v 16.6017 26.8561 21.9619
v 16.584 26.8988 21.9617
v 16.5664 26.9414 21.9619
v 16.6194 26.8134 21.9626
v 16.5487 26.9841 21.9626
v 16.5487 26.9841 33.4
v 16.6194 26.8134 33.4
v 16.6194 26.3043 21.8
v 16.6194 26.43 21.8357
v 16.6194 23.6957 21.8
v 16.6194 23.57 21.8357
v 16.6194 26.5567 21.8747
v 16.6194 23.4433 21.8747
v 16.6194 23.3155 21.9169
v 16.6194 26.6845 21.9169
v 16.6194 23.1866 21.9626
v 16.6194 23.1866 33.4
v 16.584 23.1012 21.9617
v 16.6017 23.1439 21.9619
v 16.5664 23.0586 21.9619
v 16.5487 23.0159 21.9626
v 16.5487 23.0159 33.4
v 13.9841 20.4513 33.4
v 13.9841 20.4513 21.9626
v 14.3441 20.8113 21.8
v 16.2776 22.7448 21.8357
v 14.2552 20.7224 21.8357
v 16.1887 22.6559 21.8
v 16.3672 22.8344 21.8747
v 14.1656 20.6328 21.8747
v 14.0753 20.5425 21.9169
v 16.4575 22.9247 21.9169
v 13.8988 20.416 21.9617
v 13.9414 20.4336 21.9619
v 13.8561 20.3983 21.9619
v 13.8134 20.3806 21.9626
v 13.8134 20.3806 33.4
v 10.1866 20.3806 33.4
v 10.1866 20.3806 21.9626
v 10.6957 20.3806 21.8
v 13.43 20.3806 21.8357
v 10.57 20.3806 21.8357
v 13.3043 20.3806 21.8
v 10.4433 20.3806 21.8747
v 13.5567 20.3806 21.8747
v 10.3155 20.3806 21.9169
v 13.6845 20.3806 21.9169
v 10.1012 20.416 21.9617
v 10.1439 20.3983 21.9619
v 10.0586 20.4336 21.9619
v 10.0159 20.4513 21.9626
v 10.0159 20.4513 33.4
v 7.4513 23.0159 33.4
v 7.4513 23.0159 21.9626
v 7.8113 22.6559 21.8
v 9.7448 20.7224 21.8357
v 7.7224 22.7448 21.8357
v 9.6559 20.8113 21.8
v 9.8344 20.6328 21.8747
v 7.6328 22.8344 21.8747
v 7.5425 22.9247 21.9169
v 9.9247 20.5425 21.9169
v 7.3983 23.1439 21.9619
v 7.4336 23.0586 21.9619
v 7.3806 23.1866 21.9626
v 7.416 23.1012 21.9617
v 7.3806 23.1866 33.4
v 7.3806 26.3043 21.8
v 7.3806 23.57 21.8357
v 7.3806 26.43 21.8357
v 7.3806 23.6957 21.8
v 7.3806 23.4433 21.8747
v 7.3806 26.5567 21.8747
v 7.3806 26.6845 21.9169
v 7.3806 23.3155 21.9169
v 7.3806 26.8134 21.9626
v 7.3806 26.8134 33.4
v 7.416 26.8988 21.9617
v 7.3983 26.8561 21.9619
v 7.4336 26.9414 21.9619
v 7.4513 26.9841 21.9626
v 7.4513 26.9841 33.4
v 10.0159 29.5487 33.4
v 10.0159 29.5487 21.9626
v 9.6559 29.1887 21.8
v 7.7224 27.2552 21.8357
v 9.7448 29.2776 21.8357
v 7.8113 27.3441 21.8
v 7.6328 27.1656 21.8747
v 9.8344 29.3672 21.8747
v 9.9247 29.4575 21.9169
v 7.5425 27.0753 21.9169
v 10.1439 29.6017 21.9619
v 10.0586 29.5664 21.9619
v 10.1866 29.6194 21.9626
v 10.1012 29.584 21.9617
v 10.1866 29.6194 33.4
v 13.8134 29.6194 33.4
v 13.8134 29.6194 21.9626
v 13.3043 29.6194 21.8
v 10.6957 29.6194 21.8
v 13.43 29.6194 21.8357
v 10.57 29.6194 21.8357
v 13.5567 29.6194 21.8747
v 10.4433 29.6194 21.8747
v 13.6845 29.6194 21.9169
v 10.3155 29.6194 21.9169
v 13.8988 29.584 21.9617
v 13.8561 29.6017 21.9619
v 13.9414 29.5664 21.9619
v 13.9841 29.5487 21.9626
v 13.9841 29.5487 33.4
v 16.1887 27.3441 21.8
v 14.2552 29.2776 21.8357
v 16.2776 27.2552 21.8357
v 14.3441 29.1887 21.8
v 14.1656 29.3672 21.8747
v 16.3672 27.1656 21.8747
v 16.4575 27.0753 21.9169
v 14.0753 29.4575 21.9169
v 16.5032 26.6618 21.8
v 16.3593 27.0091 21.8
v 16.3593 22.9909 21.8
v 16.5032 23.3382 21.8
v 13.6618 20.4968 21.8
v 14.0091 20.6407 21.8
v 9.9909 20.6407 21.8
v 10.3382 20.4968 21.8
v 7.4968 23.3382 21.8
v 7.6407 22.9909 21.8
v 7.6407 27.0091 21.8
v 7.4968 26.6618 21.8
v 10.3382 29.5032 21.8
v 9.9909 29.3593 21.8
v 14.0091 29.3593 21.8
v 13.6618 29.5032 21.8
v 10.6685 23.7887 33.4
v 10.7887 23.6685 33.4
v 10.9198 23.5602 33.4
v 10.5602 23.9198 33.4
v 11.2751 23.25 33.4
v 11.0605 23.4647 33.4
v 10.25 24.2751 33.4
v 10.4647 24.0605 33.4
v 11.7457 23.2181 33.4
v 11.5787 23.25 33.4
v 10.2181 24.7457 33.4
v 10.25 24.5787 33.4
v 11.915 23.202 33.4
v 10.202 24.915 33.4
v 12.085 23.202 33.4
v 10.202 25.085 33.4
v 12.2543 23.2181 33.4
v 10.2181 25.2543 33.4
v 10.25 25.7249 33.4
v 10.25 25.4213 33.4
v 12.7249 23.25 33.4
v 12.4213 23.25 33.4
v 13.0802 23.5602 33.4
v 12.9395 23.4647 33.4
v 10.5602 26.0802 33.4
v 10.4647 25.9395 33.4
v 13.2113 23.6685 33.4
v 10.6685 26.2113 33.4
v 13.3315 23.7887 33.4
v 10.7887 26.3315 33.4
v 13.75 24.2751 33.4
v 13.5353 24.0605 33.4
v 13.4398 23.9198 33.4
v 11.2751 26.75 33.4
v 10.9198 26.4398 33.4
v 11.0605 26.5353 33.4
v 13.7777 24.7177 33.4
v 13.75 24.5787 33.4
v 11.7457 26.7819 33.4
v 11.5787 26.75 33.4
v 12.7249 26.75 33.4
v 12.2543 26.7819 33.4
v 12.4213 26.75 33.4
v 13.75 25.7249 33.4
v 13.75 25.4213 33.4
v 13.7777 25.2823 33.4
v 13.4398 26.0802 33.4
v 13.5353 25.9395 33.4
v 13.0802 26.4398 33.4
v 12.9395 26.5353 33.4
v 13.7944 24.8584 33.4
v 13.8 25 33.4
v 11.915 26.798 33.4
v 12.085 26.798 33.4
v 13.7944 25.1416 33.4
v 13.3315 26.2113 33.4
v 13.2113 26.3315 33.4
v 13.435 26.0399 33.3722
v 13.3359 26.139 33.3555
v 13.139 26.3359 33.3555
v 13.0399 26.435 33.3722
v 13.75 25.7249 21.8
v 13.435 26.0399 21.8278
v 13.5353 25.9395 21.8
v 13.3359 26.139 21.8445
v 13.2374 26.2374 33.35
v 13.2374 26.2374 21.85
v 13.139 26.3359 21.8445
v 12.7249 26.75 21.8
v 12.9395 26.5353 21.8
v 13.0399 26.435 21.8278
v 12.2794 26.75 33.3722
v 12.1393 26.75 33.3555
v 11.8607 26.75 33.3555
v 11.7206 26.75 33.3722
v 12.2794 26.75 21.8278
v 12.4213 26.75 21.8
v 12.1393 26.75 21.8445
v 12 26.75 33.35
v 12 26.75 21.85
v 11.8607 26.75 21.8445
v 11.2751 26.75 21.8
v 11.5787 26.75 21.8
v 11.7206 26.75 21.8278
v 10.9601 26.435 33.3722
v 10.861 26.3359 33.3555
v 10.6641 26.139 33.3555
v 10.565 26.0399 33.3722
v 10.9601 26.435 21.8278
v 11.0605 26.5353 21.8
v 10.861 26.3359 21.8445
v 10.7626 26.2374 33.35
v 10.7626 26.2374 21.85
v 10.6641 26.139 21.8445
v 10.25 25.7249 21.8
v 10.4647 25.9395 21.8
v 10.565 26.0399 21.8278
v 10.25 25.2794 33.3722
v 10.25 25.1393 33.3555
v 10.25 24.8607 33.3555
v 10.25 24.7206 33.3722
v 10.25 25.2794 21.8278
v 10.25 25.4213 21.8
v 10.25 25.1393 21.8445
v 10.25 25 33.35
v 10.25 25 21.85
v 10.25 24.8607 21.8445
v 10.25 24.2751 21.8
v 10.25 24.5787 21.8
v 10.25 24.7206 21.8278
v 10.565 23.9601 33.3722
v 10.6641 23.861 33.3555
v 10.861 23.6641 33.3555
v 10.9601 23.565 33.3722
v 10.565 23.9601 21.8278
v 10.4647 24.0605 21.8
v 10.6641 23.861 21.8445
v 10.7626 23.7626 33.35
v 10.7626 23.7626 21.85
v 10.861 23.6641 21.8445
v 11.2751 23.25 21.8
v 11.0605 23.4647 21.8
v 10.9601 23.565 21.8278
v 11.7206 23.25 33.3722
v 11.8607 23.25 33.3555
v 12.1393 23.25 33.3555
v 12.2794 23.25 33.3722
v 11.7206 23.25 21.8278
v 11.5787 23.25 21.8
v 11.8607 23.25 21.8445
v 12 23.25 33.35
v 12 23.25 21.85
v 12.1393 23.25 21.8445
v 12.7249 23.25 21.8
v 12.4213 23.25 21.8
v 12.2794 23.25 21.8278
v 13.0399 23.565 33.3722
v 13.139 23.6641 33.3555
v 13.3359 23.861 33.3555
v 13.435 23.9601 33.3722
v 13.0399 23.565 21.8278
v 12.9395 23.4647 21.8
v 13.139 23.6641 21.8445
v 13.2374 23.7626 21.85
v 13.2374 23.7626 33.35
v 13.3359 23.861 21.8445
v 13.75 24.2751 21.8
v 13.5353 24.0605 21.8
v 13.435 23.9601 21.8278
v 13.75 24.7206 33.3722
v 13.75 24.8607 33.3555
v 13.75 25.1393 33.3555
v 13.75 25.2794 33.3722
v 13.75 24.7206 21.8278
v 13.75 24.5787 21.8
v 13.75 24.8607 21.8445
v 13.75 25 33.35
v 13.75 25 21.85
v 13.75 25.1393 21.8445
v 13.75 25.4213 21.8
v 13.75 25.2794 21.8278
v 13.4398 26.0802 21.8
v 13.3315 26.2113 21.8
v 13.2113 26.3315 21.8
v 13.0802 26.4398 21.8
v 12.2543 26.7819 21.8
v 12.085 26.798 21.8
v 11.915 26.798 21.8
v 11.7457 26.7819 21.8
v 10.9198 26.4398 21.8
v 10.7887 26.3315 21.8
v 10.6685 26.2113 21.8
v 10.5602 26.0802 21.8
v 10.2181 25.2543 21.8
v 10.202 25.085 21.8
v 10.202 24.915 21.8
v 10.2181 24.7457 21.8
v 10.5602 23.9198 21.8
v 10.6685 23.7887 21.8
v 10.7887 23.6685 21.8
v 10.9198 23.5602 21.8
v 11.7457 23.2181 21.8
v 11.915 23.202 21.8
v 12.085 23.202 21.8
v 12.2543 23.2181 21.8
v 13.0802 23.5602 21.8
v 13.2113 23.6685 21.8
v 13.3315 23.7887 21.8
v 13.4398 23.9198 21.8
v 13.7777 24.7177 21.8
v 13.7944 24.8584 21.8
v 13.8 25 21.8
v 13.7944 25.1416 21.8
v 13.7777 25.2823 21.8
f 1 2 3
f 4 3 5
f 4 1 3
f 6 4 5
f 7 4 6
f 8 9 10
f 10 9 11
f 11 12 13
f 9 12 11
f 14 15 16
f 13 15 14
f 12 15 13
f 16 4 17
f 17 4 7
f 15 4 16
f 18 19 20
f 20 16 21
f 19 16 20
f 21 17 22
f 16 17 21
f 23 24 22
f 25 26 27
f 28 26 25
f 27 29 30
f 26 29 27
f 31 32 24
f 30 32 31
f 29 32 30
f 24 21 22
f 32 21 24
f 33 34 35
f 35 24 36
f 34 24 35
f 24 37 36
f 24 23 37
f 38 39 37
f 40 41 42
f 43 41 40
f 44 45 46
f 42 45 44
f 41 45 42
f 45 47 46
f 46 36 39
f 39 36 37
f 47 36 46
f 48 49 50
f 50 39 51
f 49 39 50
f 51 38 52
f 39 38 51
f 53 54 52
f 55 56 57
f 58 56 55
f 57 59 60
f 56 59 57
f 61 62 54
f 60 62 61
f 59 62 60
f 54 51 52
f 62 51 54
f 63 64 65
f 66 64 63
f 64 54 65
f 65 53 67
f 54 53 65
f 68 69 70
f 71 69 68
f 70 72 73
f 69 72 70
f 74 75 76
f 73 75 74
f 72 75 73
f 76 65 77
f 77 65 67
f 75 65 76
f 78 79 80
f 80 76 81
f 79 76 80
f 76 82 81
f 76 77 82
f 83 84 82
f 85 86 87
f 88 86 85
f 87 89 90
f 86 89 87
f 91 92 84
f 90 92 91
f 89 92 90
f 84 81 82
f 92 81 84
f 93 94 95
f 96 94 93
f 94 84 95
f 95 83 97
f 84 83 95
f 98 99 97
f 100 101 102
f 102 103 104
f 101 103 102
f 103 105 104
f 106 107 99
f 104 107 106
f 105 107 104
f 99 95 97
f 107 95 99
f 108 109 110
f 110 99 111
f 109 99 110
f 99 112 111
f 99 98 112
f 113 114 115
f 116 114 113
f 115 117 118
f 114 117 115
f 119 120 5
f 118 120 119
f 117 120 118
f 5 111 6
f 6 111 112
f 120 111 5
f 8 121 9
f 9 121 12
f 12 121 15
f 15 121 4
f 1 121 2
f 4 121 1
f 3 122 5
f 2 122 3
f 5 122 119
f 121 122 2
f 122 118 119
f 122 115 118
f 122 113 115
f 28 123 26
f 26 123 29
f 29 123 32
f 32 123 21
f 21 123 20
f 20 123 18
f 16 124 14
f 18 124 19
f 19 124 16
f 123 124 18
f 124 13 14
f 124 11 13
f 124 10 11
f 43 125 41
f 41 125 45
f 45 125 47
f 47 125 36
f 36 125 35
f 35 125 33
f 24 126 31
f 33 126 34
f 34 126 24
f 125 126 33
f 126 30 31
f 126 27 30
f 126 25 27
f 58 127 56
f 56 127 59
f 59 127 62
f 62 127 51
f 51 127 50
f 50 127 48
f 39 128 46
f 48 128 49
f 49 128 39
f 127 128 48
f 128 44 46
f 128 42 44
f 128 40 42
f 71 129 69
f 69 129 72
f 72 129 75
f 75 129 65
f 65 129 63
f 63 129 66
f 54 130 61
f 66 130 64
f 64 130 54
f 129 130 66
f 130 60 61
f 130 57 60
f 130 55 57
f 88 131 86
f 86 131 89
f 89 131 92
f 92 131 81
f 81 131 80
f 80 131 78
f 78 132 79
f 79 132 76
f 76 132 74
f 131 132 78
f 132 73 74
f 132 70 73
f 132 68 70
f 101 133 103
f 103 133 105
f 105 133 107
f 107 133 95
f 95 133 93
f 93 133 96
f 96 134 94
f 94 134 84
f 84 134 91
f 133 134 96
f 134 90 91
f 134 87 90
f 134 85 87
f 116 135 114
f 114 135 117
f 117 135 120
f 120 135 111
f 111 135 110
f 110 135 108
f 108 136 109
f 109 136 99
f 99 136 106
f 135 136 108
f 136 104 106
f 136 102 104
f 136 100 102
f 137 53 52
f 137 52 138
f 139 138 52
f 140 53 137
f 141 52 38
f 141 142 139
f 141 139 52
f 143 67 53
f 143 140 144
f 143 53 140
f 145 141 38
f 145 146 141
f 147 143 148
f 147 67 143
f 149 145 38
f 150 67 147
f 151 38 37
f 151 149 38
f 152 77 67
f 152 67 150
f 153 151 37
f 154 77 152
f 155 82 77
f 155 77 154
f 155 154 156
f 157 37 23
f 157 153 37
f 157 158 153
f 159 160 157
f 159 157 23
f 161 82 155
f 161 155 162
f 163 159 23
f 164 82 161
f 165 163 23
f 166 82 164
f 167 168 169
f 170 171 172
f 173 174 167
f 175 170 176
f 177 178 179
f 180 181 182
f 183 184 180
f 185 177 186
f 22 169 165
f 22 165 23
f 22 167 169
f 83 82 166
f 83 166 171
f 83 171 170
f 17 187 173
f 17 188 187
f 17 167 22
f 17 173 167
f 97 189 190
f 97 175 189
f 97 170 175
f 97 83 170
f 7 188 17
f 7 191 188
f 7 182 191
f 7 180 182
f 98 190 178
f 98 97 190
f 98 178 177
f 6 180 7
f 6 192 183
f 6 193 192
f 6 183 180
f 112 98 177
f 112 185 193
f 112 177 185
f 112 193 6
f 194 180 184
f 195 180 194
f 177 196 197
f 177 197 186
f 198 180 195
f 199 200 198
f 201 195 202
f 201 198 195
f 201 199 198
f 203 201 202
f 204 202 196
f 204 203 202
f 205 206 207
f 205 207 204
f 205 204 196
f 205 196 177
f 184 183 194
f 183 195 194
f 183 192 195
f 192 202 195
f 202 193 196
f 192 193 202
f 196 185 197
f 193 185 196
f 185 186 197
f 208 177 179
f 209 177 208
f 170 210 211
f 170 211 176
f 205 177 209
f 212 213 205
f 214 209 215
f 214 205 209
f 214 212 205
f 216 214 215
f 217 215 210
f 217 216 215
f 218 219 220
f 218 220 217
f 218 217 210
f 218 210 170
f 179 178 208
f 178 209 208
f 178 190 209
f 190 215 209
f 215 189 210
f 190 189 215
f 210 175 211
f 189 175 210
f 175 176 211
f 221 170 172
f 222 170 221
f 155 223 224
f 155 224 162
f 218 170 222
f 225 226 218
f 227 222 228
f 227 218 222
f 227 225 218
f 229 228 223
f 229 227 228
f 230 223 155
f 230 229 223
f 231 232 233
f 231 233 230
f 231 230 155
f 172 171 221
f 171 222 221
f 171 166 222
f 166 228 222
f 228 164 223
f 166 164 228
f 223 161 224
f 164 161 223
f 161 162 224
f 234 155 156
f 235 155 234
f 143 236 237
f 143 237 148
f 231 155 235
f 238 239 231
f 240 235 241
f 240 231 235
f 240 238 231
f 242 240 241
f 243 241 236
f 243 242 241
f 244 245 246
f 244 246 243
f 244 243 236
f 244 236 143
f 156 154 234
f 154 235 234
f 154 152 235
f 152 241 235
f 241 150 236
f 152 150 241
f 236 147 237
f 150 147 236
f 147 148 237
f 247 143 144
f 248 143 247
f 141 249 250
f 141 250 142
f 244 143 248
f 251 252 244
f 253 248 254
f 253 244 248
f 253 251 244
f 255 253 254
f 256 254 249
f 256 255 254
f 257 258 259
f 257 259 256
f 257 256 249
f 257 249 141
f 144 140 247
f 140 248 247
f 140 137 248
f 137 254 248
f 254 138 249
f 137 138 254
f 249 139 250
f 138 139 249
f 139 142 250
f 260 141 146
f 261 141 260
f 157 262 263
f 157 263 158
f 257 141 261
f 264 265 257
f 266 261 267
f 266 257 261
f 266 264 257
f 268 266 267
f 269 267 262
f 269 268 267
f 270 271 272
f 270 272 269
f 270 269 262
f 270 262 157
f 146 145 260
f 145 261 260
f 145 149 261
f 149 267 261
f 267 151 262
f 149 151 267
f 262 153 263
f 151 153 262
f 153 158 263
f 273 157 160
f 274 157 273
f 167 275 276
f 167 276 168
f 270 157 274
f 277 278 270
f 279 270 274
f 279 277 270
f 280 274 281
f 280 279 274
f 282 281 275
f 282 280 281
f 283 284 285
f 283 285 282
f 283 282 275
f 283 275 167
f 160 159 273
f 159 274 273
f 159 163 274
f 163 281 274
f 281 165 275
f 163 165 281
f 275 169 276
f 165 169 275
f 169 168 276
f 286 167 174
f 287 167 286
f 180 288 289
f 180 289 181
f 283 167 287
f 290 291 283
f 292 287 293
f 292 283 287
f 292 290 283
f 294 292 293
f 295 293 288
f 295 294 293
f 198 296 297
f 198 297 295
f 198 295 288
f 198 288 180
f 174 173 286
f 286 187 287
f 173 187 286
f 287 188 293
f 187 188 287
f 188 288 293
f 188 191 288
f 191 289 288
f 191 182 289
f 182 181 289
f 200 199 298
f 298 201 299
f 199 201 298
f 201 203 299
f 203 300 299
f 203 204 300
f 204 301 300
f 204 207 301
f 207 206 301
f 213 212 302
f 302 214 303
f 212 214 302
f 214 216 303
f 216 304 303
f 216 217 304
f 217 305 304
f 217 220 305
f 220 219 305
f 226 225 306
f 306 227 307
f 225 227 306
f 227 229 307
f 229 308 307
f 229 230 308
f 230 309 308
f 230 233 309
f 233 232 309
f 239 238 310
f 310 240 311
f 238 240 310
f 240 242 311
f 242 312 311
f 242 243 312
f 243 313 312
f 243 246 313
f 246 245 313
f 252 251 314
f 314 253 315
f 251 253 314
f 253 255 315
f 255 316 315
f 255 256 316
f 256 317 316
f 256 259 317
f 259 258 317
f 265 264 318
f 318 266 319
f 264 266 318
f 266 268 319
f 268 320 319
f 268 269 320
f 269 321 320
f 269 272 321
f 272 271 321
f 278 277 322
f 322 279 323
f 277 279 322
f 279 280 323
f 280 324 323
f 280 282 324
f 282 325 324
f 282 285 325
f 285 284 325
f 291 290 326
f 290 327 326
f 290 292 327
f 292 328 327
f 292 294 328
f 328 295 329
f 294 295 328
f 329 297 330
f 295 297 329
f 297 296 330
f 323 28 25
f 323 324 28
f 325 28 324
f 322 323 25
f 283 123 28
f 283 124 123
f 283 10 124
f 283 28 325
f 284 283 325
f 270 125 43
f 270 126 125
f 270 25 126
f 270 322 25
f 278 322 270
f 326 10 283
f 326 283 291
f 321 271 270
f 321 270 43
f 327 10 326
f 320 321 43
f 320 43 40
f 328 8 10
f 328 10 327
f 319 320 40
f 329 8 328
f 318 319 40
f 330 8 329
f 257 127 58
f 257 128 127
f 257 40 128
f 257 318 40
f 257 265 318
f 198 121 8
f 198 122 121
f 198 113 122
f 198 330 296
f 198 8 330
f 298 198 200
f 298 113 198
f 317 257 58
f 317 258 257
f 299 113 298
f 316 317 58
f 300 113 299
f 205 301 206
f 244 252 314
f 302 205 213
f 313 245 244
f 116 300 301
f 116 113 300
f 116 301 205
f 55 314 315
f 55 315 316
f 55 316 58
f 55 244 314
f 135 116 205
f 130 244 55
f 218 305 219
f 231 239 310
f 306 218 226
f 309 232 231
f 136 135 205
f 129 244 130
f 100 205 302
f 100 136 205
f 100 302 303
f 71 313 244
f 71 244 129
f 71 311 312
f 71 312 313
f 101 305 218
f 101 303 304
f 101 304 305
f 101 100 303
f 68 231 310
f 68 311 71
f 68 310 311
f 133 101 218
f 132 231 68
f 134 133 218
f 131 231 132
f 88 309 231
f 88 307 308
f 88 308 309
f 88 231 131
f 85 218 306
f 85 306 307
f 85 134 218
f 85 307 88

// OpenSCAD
// Generated by the canonical parent Python sources and validated exchange pipeline.
polyhedron(points=[[16.60171890258789, 26.856096267700195, 21.961946487426758], [16.584041595458984, 26.898773193359375, 21.96173095703125], [16.56636619567871, 26.941448211669922, 21.961946487426758], [16.61939811706543, 26.813417434692383, 21.96259117126465], [16.548686981201172, 26.984127044677734, 21.96259117126465], [16.548686981201172, 26.984127044677734, 33.400001525878906], [16.61939811706543, 26.813417434692383, 33.400001525878906], [16.61939811706543, 26.30428695678711, 21.799999237060547], [16.61939811706543, 26.430021286010742, 21.83568000793457], [16.61939811706543, 23.69571304321289, 21.799999237060547], [16.61939811706543, 23.569978713989258, 21.83568000793457], [16.61939811706543, 26.556730270385742, 21.874652862548828], [16.61939811706543, 23.443269729614258, 21.874652862548828], [16.61939811706543, 23.315500259399414, 21.916948318481445], [16.61939811706543, 26.684499740600586, 21.916948318481445], [16.61939811706543, 23.186582565307617, 21.96259117126465], [16.61939811706543, 23.186582565307617, 33.400001525878906], [16.584041595458984, 23.101226806640625, 21.96173095703125], [16.60171890258789, 23.143903732299805, 21.961946487426758], [16.56636619567871, 23.058551788330078, 21.961946487426758], [16.548686981201172, 23.015872955322266, 21.96259117126465], [16.548686981201172, 23.015872955322266, 33.400001525878906], [13.98412799835205, 20.451313018798828, 33.400001525878906], [13.98412799835205, 20.451313018798828, 21.96259117126465], [14.344137191772461, 20.811323165893555, 21.799999237060547], [16.277585983276367, 22.744770050048828, 21.83568000793457], [14.255228996276855, 20.722414016723633, 21.83568000793457], [16.188676834106445, 22.65586280822754, 21.799999237060547], [16.3671817779541, 22.834367752075195, 21.874652862548828], [14.165632247924805, 20.6328182220459, 21.874652862548828], [14.075285911560059, 20.542470932006836, 21.916948318481445], [16.457529067993164, 22.924715042114258, 21.916948318481445], [13.898772239685059, 20.415958404541016, 21.96173095703125], [13.941448211669922, 20.43363380432129, 21.961946487426758], [13.856096267700195, 20.39828109741211, 21.961946487426758], [13.813417434692383, 20.38060188293457, 21.96259117126465], [13.813417434692383, 20.38060188293457, 33.400001525878906], [10.186582565307617, 20.38060188293457, 33.400001525878906], [10.186582565307617, 20.38060188293457, 21.96259117126465], [10.69571304321289, 20.38060188293457, 21.799999237060547], [13.430022239685059, 20.38060188293457, 21.83568000793457], [10.569977760314941, 20.38060188293457, 21.83568000793457], [13.30428695678711, 20.38060188293457, 21.799999237060547], [10.443268775939941, 20.38060188293457, 21.874652862548828], [13.556731224060059, 20.38060188293457, 21.874652862548828], [10.315499305725098, 20.38060188293457, 21.916948318481445], [13.684500694274902, 20.38060188293457, 21.916948318481445], [10.101227760314941, 20.415958404541016, 21.96173095703125], [10.143903732299805, 20.39828109741211, 21.961946487426758], [10.058551788330078, 20.43363380432129, 21.961946487426758], [10.01587200164795, 20.451313018798828, 21.96259117126465], [10.01587200164795, 20.451313018798828, 33.400001525878906], [7.451313018798828, 23.015872955322266, 33.400001525878906], [7.451313018798828, 23.015872955322266, 21.96259117126465], [7.811322212219238, 22.65586280822754, 21.799999237060547], [9.744771003723145, 20.722414016723633, 21.83568000793457], [7.722414493560791, 22.744770050048828, 21.83568000793457], [9.655862808227539, 20.811323165893555, 21.799999237060547], [9.834367752075195, 20.6328182220459, 21.874652862548828], [7.63281774520874, 22.834367752075195, 21.874652862548828], [7.542470932006836, 22.924715042114258, 21.916948318481445], [9.924714088439941, 20.542470932006836, 21.916948318481445], [7.398280620574951, 23.143903732299805, 21.961946487426758], [7.4336347579956055, 23.058551788330078, 21.961946487426758], [7.3806023597717285, 23.186582565307617, 21.96259117126465], [7.415957450866699, 23.101226806640625, 21.96173095703125], [7.3806023597717285, 23.186582565307617, 33.400001525878906], [7.3806023597717285, 26.30428695678711, 21.799999237060547], [7.3806023597717285, 23.569978713989258, 21.83568000793457], [7.3806023597717285, 26.430021286010742, 21.83568000793457], [7.3806023597717285, 23.69571304321289, 21.799999237060547], [7.3806023597717285, 23.443269729614258, 21.874652862548828], [7.3806023597717285, 26.556730270385742, 21.874652862548828], [7.3806023597717285, 26.684499740600586, 21.916948318481445], [7.3806023597717285, 23.315500259399414, 21.916948318481445], [7.3806023597717285, 26.813417434692383, 21.96259117126465], [7.3806023597717285, 26.813417434692383, 33.400001525878906], [7.415957450866699, 26.898773193359375, 21.96173095703125], [7.398280620574951, 26.856096267700195, 21.961946487426758], [7.4336347579956055, 26.941448211669922, 21.961946487426758], [7.451313018798828, 26.984127044677734, 21.96259117126465], [7.451313018798828, 26.984127044677734, 33.400001525878906], [10.01587200164795, 29.548686981201172, 33.400001525878906], [10.01587200164795, 29.548686981201172, 21.96259117126465], [9.655862808227539, 29.188676834106445, 21.799999237060547], [7.722414493560791, 27.255229949951172, 21.83568000793457], [9.744771003723145, 29.277585983276367, 21.83568000793457], [7.811322212219238, 27.34413719177246, 21.799999237060547], [7.63281774520874, 27.165632247924805, 21.874652862548828], [9.834367752075195, 29.3671817779541, 21.874652862548828], [9.924714088439941, 29.457529067993164, 21.916948318481445], [7.542470932006836, 27.075284957885742, 21.916948318481445], [10.143903732299805, 29.60171890258789, 21.961946487426758], [10.058551788330078, 29.56636619567871, 21.961946487426758], [10.186582565307617, 29.61939811706543, 21.96259117126465], [10.101227760314941, 29.584041595458984, 21.96173095703125], [10.186582565307617, 29.61939811706543, 33.400001525878906], [13.813417434692383, 29.61939811706543, 33.400001525878906], [13.813417434692383, 29.61939811706543, 21.96259117126465], [13.30428695678711, 29.61939811706543, 21.799999237060547], [10.69571304321289, 29.61939811706543, 21.799999237060547], [13.430022239685059, 29.61939811706543, 21.83568000793457], [10.569977760314941, 29.61939811706543, 21.83568000793457], [13.556731224060059, 29.61939811706543, 21.874652862548828], [10.443268775939941, 29.61939811706543, 21.874652862548828], [13.684500694274902, 29.61939811706543, 21.916948318481445], [10.315499305725098, 29.61939811706543, 21.916948318481445], [13.898772239685059, 29.584041595458984, 21.96173095703125], [13.856096267700195, 29.60171890258789, 21.961946487426758], [13.941448211669922, 29.56636619567871, 21.961946487426758], [13.98412799835205, 29.548686981201172, 21.96259117126465], [13.98412799835205, 29.548686981201172, 33.400001525878906], [16.188676834106445, 27.34413719177246, 21.799999237060547], [14.255228996276855, 29.277585983276367, 21.83568000793457], [16.277585983276367, 27.255229949951172, 21.83568000793457], [14.344137191772461, 29.188676834106445, 21.799999237060547], [14.165632247924805, 29.3671817779541, 21.874652862548828], [16.3671817779541, 27.165632247924805, 21.874652862548828], [16.457529067993164, 27.075284957885742, 21.916948318481445], [14.075285911560059, 29.457529067993164, 21.916948318481445], [16.50315284729004, 26.661808013916016, 21.799999237060547], [16.35928726196289, 27.00913429260254, 21.799999237060547], [16.35928726196289, 22.99086570739746, 21.799999237060547], [16.50315284729004, 23.338191986083984, 21.799999237060547], [13.661808013916016, 20.49684715270996, 21.799999237060547], [14.009135246276855, 20.64071273803711, 21.799999237060547], [9.990864753723145, 20.64071273803711, 21.799999237060547], [10.338191986083984, 20.49684715270996, 21.799999237060547], [7.4968461990356445, 23.338191986083984, 21.799999237060547], [7.640713691711426, 22.99086570739746, 21.799999237060547], [7.640713691711426, 27.00913429260254, 21.799999237060547], [7.4968461990356445, 26.661808013916016, 21.799999237060547], [10.338191986083984, 29.50315284729004, 21.799999237060547], [9.990864753723145, 29.35928726196289, 21.799999237060547], [14.009135246276855, 29.35928726196289, 21.799999237060547], [13.661808013916016, 29.50315284729004, 21.799999237060547], [10.668511390686035, 23.788745880126953, 33.400001525878906], [10.788745880126953, 23.66851043701172, 33.400001525878906], [10.91978931427002, 23.560157775878906, 33.400001525878906], [10.560157775878906, 23.919790267944336, 33.400001525878906], [11.275126457214355, 23.25, 33.400001525878906], [11.06047248840332, 23.46465301513672, 33.400001525878906], [10.25, 24.27512550354004, 33.400001525878906], [10.464653968811035, 24.06047248840332, 33.400001525878906], [11.745701789855957, 23.218053817749023, 33.400001525878906], [11.578692436218262, 23.25, 33.400001525878906], [10.218053817749023, 24.745702743530273, 33.400001525878906], [10.25, 24.578693389892578, 33.400001525878906], [11.9149808883667, 23.202009201049805, 33.400001525878906], [10.202009201049805, 24.914981842041016, 33.400001525878906], [12.0850191116333, 23.202009201049805, 33.400001525878906], [10.202009201049805, 25.085018157958984, 33.400001525878906], [12.254298210144043, 23.218053817749023, 33.400001525878906], [10.218053817749023, 25.254297256469727, 33.400001525878906], [10.25, 25.72487449645996, 33.400001525878906], [10.25, 25.421306610107422, 33.400001525878906], [12.724873542785645, 23.25, 33.400001525878906], [12.421307563781738, 23.25, 33.400001525878906], [13.08021068572998, 23.560157775878906, 33.400001525878906], [12.93952751159668, 23.46465301513672, 33.400001525878906], [10.560157775878906, 26.080209732055664, 33.400001525878906], [10.464653968811035, 25.93952751159668, 33.400001525878906], [13.211254119873047, 23.66851043701172, 33.400001525878906], [10.668511390686035, 26.211254119873047, 33.400001525878906], [13.331488609313965, 23.788745880126953, 33.400001525878906], [10.788745880126953, 26.33148956298828, 33.400001525878906], [13.75, 24.27512550354004, 33.400001525878906], [13.535346031188965, 24.06047248840332, 33.400001525878906], [13.439842224121094, 23.919790267944336, 33.400001525878906], [11.275126457214355, 26.75, 33.400001525878906], [10.91978931427002, 26.439842224121094, 33.400001525878906], [11.06047248840332, 26.53534698486328, 33.400001525878906], [13.77772045135498, 24.717668533325195, 33.400001525878906], [13.75, 24.578693389892578, 33.400001525878906], [11.745701789855957, 26.781946182250977, 33.400001525878906], [11.578692436218262, 26.75, 33.400001525878906], [12.724873542785645, 26.75, 33.400001525878906], [12.254298210144043, 26.781946182250977, 33.400001525878906], [12.421307563781738, 26.75, 33.400001525878906], [13.75, 25.72487449645996, 33.400001525878906], [13.75, 25.421306610107422, 33.400001525878906], [13.77772045135498, 25.282331466674805, 33.400001525878906], [13.439842224121094, 26.080209732055664, 33.400001525878906], [13.535346031188965, 25.93952751159668, 33.400001525878906], [13.08021068572998, 26.439842224121094, 33.400001525878906], [12.93952751159668, 26.53534698486328, 33.400001525878906], [13.794421195983887, 24.858396530151367, 33.400001525878906], [13.800000190734863, 25.0, 33.400001525878906], [11.9149808883667, 26.797990798950195, 33.400001525878906], [12.0850191116333, 26.797990798950195, 33.400001525878906], [13.794421195983887, 25.141603469848633, 33.400001525878906], [13.331488609313965, 26.211254119873047, 33.400001525878906], [13.211254119873047, 26.33148956298828, 33.400001525878906], [13.435003280639648, 26.039871215820312, 33.37216567993164], [13.335908889770508, 26.138965606689453, 33.355533599853516], [13.138965606689453, 26.335908889770508, 33.355533599853516], [13.039871215820312, 26.43500328063965, 33.37216567993164], [13.75, 25.72487449645996, 21.799999237060547], [13.435003280639648, 26.039871215820312, 21.827836990356445], [13.535346031188965, 25.93952751159668, 21.799999237060547], [13.335908889770508, 26.138965606689453, 21.844467163085938], [13.23743724822998, 26.237436294555664, 33.349998474121094], [13.23743724822998, 26.237436294555664, 21.850000381469727], [13.138965606689453, 26.335908889770508, 21.844467163085938], [12.724873542785645, 26.75, 21.799999237060547], [12.93952751159668, 26.53534698486328, 21.799999237060547], [13.039871215820312, 26.43500328063965, 21.827836990356445], [12.279400825500488, 26.75, 33.37216567993164], [12.139260292053223, 26.75, 33.355533599853516], [11.860739707946777, 26.75, 33.355533599853516], [11.720599174499512, 26.75, 33.37216567993164], [12.279400825500488, 26.75, 21.827836990356445], [12.421307563781738, 26.75, 21.799999237060547], [12.139260292053223, 26.75, 21.844467163085938], [12.0, 26.75, 33.349998474121094], [12.0, 26.75, 21.850000381469727], [11.860739707946777, 26.75, 21.844467163085938], [11.275126457214355, 26.75, 21.799999237060547], [11.578692436218262, 26.75, 21.799999237060547], [11.720599174499512, 26.75, 21.827836990356445], [10.960128784179688, 26.43500328063965, 33.37216567993164], [10.861034393310547, 26.335908889770508, 33.355533599853516], [10.664091110229492, 26.138965606689453, 33.355533599853516], [10.564996719360352, 26.039871215820312, 33.37216567993164], [10.960128784179688, 26.43500328063965, 21.827836990356445], [11.06047248840332, 26.53534698486328, 21.799999237060547], [10.861034393310547, 26.335908889770508, 21.844467163085938], [10.76256275177002, 26.237436294555664, 33.349998474121094], [10.76256275177002, 26.237436294555664, 21.850000381469727], [10.664091110229492, 26.138965606689453, 21.844467163085938], [10.25, 25.72487449645996, 21.799999237060547], [10.464653968811035, 25.93952751159668, 21.799999237060547], [10.564996719360352, 26.039871215820312, 21.827836990356445], [10.25, 25.279399871826172, 33.37216567993164], [10.25, 25.139259338378906, 33.355533599853516], [10.25, 24.860740661621094, 33.355533599853516], [10.25, 24.720600128173828, 33.37216567993164], [10.25, 25.279399871826172, 21.827836990356445], [10.25, 25.421306610107422, 21.799999237060547], [10.25, 25.139259338378906, 21.844467163085938], [10.25, 25.0, 33.349998474121094], [10.25, 25.0, 21.850000381469727], [10.25, 24.860740661621094, 21.844467163085938], [10.25, 24.27512550354004, 21.799999237060547], [10.25, 24.578693389892578, 21.799999237060547], [10.25, 24.720600128173828, 21.827836990356445], [10.564996719360352, 23.960128784179688, 33.37216567993164], [10.664091110229492, 23.861034393310547, 33.355533599853516], [10.861034393310547, 23.664091110229492, 33.355533599853516], [10.960128784179688, 23.56499671936035, 33.37216567993164], [10.564996719360352, 23.960128784179688, 21.827836990356445], [10.464653968811035, 24.06047248840332, 21.799999237060547], [10.664091110229492, 23.861034393310547, 21.844467163085938], [10.76256275177002, 23.762563705444336, 33.349998474121094], [10.76256275177002, 23.762563705444336, 21.850000381469727], [10.861034393310547, 23.664091110229492, 21.844467163085938], [11.275126457214355, 23.25, 21.799999237060547], [11.06047248840332, 23.46465301513672, 21.799999237060547], [10.960128784179688, 23.56499671936035, 21.827836990356445], [11.720599174499512, 23.25, 33.37216567993164], [11.860739707946777, 23.25, 33.355533599853516], [12.139260292053223, 23.25, 33.355533599853516], [12.279400825500488, 23.25, 33.37216567993164], [11.720599174499512, 23.25, 21.827836990356445], [11.578692436218262, 23.25, 21.799999237060547], [11.860739707946777, 23.25, 21.844467163085938], [12.0, 23.25, 33.349998474121094], [12.0, 23.25, 21.850000381469727], [12.139260292053223, 23.25, 21.844467163085938], [12.724873542785645, 23.25, 21.799999237060547], [12.421307563781738, 23.25, 21.799999237060547], [12.279400825500488, 23.25, 21.827836990356445], [13.039871215820312, 23.56499671936035, 33.37216567993164], [13.138965606689453, 23.664091110229492, 33.355533599853516], [13.335908889770508, 23.861034393310547, 33.355533599853516], [13.435003280639648, 23.960128784179688, 33.37216567993164], [13.039871215820312, 23.56499671936035, 21.827836990356445], [12.93952751159668, 23.46465301513672, 21.799999237060547], [13.138965606689453, 23.664091110229492, 21.844467163085938], [13.23743724822998, 23.762563705444336, 21.850000381469727], [13.23743724822998, 23.762563705444336, 33.349998474121094], [13.335908889770508, 23.861034393310547, 21.844467163085938], [13.75, 24.27512550354004, 21.799999237060547], [13.535346031188965, 24.06047248840332, 21.799999237060547], [13.435003280639648, 23.960128784179688, 21.827836990356445], [13.75, 24.720600128173828, 33.37216567993164], [13.75, 24.860740661621094, 33.355533599853516], [13.75, 25.139259338378906, 33.355533599853516], [13.75, 25.279399871826172, 33.37216567993164], [13.75, 24.720600128173828, 21.827836990356445], [13.75, 24.578693389892578, 21.799999237060547], [13.75, 24.860740661621094, 21.844467163085938], [13.75, 25.0, 33.349998474121094], [13.75, 25.0, 21.850000381469727], [13.75, 25.139259338378906, 21.844467163085938], [13.75, 25.421306610107422, 21.799999237060547], [13.75, 25.279399871826172, 21.827836990356445], [13.439842224121094, 26.080209732055664, 21.799999237060547], [13.331488609313965, 26.211254119873047, 21.799999237060547], [13.211254119873047, 26.33148956298828, 21.799999237060547], [13.08021068572998, 26.439842224121094, 21.799999237060547], [12.254298210144043, 26.781946182250977, 21.799999237060547], [12.0850191116333, 26.797990798950195, 21.799999237060547], [11.9149808883667, 26.797990798950195, 21.799999237060547], [11.745701789855957, 26.781946182250977, 21.799999237060547], [10.91978931427002, 26.439842224121094, 21.799999237060547], [10.788745880126953, 26.33148956298828, 21.799999237060547], [10.668511390686035, 26.211254119873047, 21.799999237060547], [10.560157775878906, 26.080209732055664, 21.799999237060547], [10.218053817749023, 25.254297256469727, 21.799999237060547], [10.202009201049805, 25.085018157958984, 21.799999237060547], [10.202009201049805, 24.914981842041016, 21.799999237060547], [10.218053817749023, 24.745702743530273, 21.799999237060547], [10.560157775878906, 23.919790267944336, 21.799999237060547], [10.668511390686035, 23.788745880126953, 21.799999237060547], [10.788745880126953, 23.66851043701172, 21.799999237060547], [10.91978931427002, 23.560157775878906, 21.799999237060547], [11.745701789855957, 23.218053817749023, 21.799999237060547], [11.9149808883667, 23.202009201049805, 21.799999237060547], [12.0850191116333, 23.202009201049805, 21.799999237060547], [12.254298210144043, 23.218053817749023, 21.799999237060547], [13.08021068572998, 23.560157775878906, 21.799999237060547], [13.211254119873047, 23.66851043701172, 21.799999237060547], [13.331488609313965, 23.788745880126953, 21.799999237060547], [13.439842224121094, 23.919790267944336, 21.799999237060547], [13.77772045135498, 24.717668533325195, 21.799999237060547], [13.794421195983887, 24.858396530151367, 21.799999237060547], [13.800000190734863, 25.0, 21.799999237060547], [13.794421195983887, 25.141603469848633, 21.799999237060547], [13.77772045135498, 25.282331466674805, 21.799999237060547]],faces=[[2, 1, 0], [4, 2, 3], [2, 0, 3], [4, 3, 5], [5, 3, 6], [9, 8, 7], [10, 8, 9], [12, 11, 10], [10, 11, 8], [15, 14, 13], [13, 14, 12], [12, 14, 11], [16, 3, 15], [6, 3, 16], [15, 3, 14], [19, 18, 17], [20, 15, 19], [19, 15, 18], [21, 16, 20], [20, 16, 15], [21, 23, 22], [26, 25, 24], [24, 25, 27], [29, 28, 26], [26, 28, 25], [23, 31, 30], [30, 31, 29], [29, 31, 28], [21, 20, 23], [23, 20, 31], [34, 33, 32], [35, 23, 34], [34, 23, 33], [35, 36, 23], [36, 22, 23], [36, 38, 37], [41, 40, 39], [39, 40, 42], [45, 44, 43], [43, 44, 41], [41, 44, 40], [45, 46, 44], [38, 35, 45], [36, 35, 38], [45, 35, 46], [49, 48, 47], [50, 38, 49], [49, 38, 48], [51, 37, 50], [50, 37, 38], [51, 53, 52], [56, 55, 54], [54, 55, 57], [59, 58, 56], [56, 58, 55], [53, 61, 60], [60, 61, 59], [59, 61, 58], [51, 50, 53], [53, 50, 61], [64, 63, 62], [62, 63, 65], [64, 53, 63], [66, 52, 64], [64, 52, 53], [69, 68, 67], [67, 68, 70], [72, 71, 69], [69, 71, 68], [75, 74, 73], [73, 74, 72], [72, 74, 71], [76, 64, 75], [66, 64, 76], [75, 64, 74], [79, 78, 77], [80, 75, 79], [79, 75, 78], [80, 81, 75], [81, 76, 75], [81, 83, 82], [86, 85, 84], [84, 85, 87], [89, 88, 86], [86, 88, 85], [83, 91, 90], [90, 91, 89], [89, 91, 88], [81, 80, 83], [83, 80, 91], [94, 93, 92], [92, 93, 95], [94, 83, 93], [96, 82, 94], [94, 82, 83], [96, 98, 97], [101, 100, 99], [103, 102, 101], [101, 102, 100], [103, 104, 102], [98, 106, 105], [105, 106, 103], [103, 106, 104], [96, 94, 98], [98, 94, 106], [109, 108, 107], [110, 98, 109], [109, 98, 108], [110, 111, 98], [111, 97, 98], [114, 113, 112], [112, 113, 115], [117, 116, 114], [114, 116, 113], [4, 119, 118], [118, 119, 117], [117, 119, 116], [5, 110, 4], [111, 110, 5], [4, 110, 119], [8, 120, 7], [11, 120, 8], [14, 120, 11], [3, 120, 14], [1, 120, 0], [0, 120, 3], [4, 121, 2], [2, 121, 1], [118, 121, 4], [1, 121, 120], [118, 117, 121], [117, 114, 121], [114, 112, 121], [25, 122, 27], [28, 122, 25], [31, 122, 28], [20, 122, 31], [19, 122, 20], [17, 122, 19], [13, 123, 15], [18, 123, 17], [15, 123, 18], [17, 123, 122], [13, 12, 123], [12, 10, 123], [10, 9, 123], [40, 124, 42], [44, 124, 40], [46, 124, 44], [35, 124, 46], [34, 124, 35], [32, 124, 34], [30, 125, 23], [33, 125, 32], [23, 125, 33], [32, 125, 124], [30, 29, 125], [29, 26, 125], [26, 24, 125], [55, 126, 57], [58, 126, 55], [61, 126, 58], [50, 126, 61], [49, 126, 50], [47, 126, 49], [45, 127, 38], [48, 127, 47], [38, 127, 48], [47, 127, 126], [45, 43, 127], [43, 41, 127], [41, 39, 127], [68, 128, 70], [71, 128, 68], [74, 128, 71], [64, 128, 74], [62, 128, 64], [65, 128, 62], [60, 129, 53], [63, 129, 65], [53, 129, 63], [65, 129, 128], [60, 59, 129], [59, 56, 129], [56, 54, 129], [85, 130, 87], [88, 130, 85], [91, 130, 88], [80, 130, 91], [79, 130, 80], [77, 130, 79], [78, 131, 77], [75, 131, 78], [73, 131, 75], [77, 131, 130], [73, 72, 131], [72, 69, 131], [69, 67, 131], [102, 132, 100], [104, 132, 102], [106, 132, 104], [94, 132, 106], [92, 132, 94], [95, 132, 92], [93, 133, 95], [83, 133, 93], [90, 133, 83], [95, 133, 132], [90, 89, 133], [89, 86, 133], [86, 84, 133], [113, 134, 115], [116, 134, 113], [119, 134, 116], [110, 134, 119], [109, 134, 110], [107, 134, 109], [108, 135, 107], [98, 135, 108], [105, 135, 98], [107, 135, 134], [105, 103, 135], [103, 101, 135], [101, 99, 135], [51, 52, 136], [137, 51, 136], [51, 137, 138], [136, 52, 139], [37, 51, 140], [138, 141, 140], [51, 138, 140], [52, 66, 142], [143, 139, 142], [139, 52, 142], [37, 140, 144], [140, 145, 144], [147, 142, 146], [142, 66, 146], [37, 144, 148], [146, 66, 149], [36, 37, 150], [37, 148, 150], [66, 76, 151], [149, 66, 151], [36, 150, 152], [151, 76, 153], [76, 81, 154], [153, 76, 154], [155, 153, 154], [22, 36, 156], [36, 152, 156], [152, 157, 156], [156, 159, 158], [22, 156, 158], [154, 81, 160], [161, 154, 160], [22, 158, 162], [160, 81, 163], [22, 162, 164], [163, 81, 165], [168, 167, 166], [171, 170, 169], [166, 173, 172], [175, 169, 174], [178, 177, 176], [181, 180, 179], [179, 183, 182], [185, 176, 184], [164, 168, 21], [22, 164, 21], [168, 166, 21], [165, 81, 82], [170, 165, 82], [169, 170, 82], [172, 186, 16], [186, 187, 16], [21, 166, 16], [166, 172, 16], [189, 188, 96], [188, 174, 96], [174, 169, 96], [169, 82, 96], [16, 187, 6], [187, 190, 6], [190, 181, 6], [181, 179, 6], [177, 189, 97], [189, 96, 97], [176, 177, 97], [6, 179, 5], [182, 191, 5], [191, 192, 5], [179, 182, 5], [176, 97, 111], [192, 184, 111], [184, 176, 111], [5, 192, 111], [183, 179, 193], [193, 179, 194], [196, 195, 176], [185, 196, 176], [194, 179, 197], [197, 199, 198], [201, 194, 200], [194, 197, 200], [197, 198, 200], [201, 200, 202], [195, 201, 203], [201, 202, 203], [206, 205, 204], [203, 206, 204], [195, 203, 204], [176, 195, 204], [193, 182, 183], [193, 194, 182], [194, 191, 182], [194, 201, 191], [195, 192, 201], [201, 192, 191], [196, 184, 195], [195, 184, 192], [196, 185, 184], [178, 176, 207], [207, 176, 208], [210, 209, 169], [175, 210, 169], [208, 176, 204], [204, 212, 211], [214, 208, 213], [208, 204, 213], [204, 211, 213], [214, 213, 215], [209, 214, 216], [214, 215, 216], [219, 218, 217], [216, 219, 217], [209, 216, 217], [169, 209, 217], [207, 177, 178], [207, 208, 177], [208, 189, 177], [208, 214, 189], [209, 188, 214], [214, 188, 189], [210, 174, 209], [209, 174, 188], [210, 175, 174], [171, 169, 220], [220, 169, 221], [223, 222, 154], [161, 223, 154], [221, 169, 217], [217, 225, 224], [227, 221, 226], [221, 217, 226], [217, 224, 226], [222, 227, 228], [227, 226, 228], [154, 222, 229], [222, 228, 229], [232, 231, 230], [229, 232, 230], [154, 229, 230], [220, 170, 171], [220, 221, 170], [221, 165, 170], [221, 227, 165], [222, 163, 227], [227, 163, 165], [223, 160, 222], [222, 160, 163], [223, 161, 160], [155, 154, 233], [233, 154, 234], [236, 235, 142], [147, 236, 142], [234, 154, 230], [230, 238, 237], [240, 234, 239], [234, 230, 239], [230, 237, 239], [240, 239, 241], [235, 240, 242], [240, 241, 242], [245, 244, 243], [242, 245, 243], [235, 242, 243], [142, 235, 243], [233, 153, 155], [233, 234, 153], [234, 151, 153], [234, 240, 151], [235, 149, 240], [240, 149, 151], [236, 146, 235], [235, 146, 149], [236, 147, 146], [143, 142, 246], [246, 142, 247], [249, 248, 140], [141, 249, 140], [247, 142, 243], [243, 251, 250], [253, 247, 252], [247, 243, 252], [243, 250, 252], [253, 252, 254], [248, 253, 255], [253, 254, 255], [258, 257, 256], [255, 258, 256], [248, 255, 256], [140, 248, 256], [246, 139, 143], [246, 247, 139], [247, 136, 139], [247, 253, 136], [248, 137, 253], [253, 137, 136], [249, 138, 248], [248, 138, 137], [249, 141, 138], [145, 140, 259], [259, 140, 260], [262, 261, 156], [157, 262, 156], [260, 140, 256], [256, 264, 263], [266, 260, 265], [260, 256, 265], [256, 263, 265], [266, 265, 267], [261, 266, 268], [266, 267, 268], [271, 270, 269], [268, 271, 269], [261, 268, 269], [156, 261, 269], [259, 144, 145], [259, 260, 144], [260, 148, 144], [260, 266, 148], [261, 150, 266], [266, 150, 148], [262, 152, 261], [261, 152, 150], [262, 157, 152], [159, 156, 272], [272, 156, 273], [275, 274, 166], [167, 275, 166], [273, 156, 269], [269, 277, 276], [273, 269, 278], [269, 276, 278], [280, 273, 279], [273, 278, 279], [274, 280, 281], [280, 279, 281], [284, 283, 282], [281, 284, 282], [274, 281, 282], [166, 274, 282], [272, 158, 159], [272, 273, 158], [273, 162, 158], [273, 280, 162], [274, 164, 280], [280, 164, 162], [275, 168, 274], [274, 168, 164], [275, 167, 168], [173, 166, 285], [285, 166, 286], [288, 287, 179], [180, 288, 179], [286, 166, 282], [282, 290, 289], [292, 286, 291], [286, 282, 291], [282, 289, 291], [292, 291, 293], [287, 292, 294], [292, 293, 294], [296, 295, 197], [294, 296, 197], [287, 294, 197], [179, 287, 197], [285, 172, 173], [286, 186, 285], [285, 186, 172], [292, 187, 286], [286, 187, 186], [292, 287, 187], [287, 190, 187], [287, 288, 190], [288, 181, 190], [288, 180, 181], [297, 198, 199], [298, 200, 297], [297, 200, 198], [298, 202, 200], [298, 299, 202], [299, 203, 202], [299, 300, 203], [300, 206, 203], [300, 205, 206], [301, 211, 212], [302, 213, 301], [301, 213, 211], [302, 215, 213], [302, 303, 215], [303, 216, 215], [303, 304, 216], [304, 219, 216], [304, 218, 219], [305, 224, 225], [306, 226, 305], [305, 226, 224], [306, 228, 226], [306, 307, 228], [307, 229, 228], [307, 308, 229], [308, 232, 229], [308, 231, 232], [309, 237, 238], [310, 239, 309], [309, 239, 237], [310, 241, 239], [310, 311, 241], [311, 242, 241], [311, 312, 242], [312, 245, 242], [312, 244, 245], [313, 250, 251], [314, 252, 313], [313, 252, 250], [314, 254, 252], [314, 315, 254], [315, 255, 254], [315, 316, 255], [316, 258, 255], [316, 257, 258], [317, 263, 264], [318, 265, 317], [317, 265, 263], [318, 267, 265], [318, 319, 267], [319, 268, 267], [319, 320, 268], [320, 271, 268], [320, 270, 271], [321, 276, 277], [322, 278, 321], [321, 278, 276], [322, 279, 278], [322, 323, 279], [323, 281, 279], [323, 324, 281], [324, 284, 281], [324, 283, 284], [325, 289, 290], [325, 326, 289], [326, 291, 289], [326, 327, 291], [327, 293, 291], [328, 294, 327], [327, 294, 293], [329, 296, 328], [328, 296, 294], [329, 295, 296], [24, 27, 322], [27, 323, 322], [323, 27, 324], [24, 322, 321], [27, 122, 282], [122, 123, 282], [123, 9, 282], [324, 27, 282], [324, 282, 283], [42, 124, 269], [124, 125, 269], [125, 24, 269], [24, 321, 269], [269, 321, 277], [282, 9, 325], [290, 282, 325], [269, 270, 320], [42, 269, 320], [325, 9, 326], [42, 320, 319], [39, 42, 319], [9, 7, 327], [326, 9, 327], [39, 319, 318], [327, 7, 328], [39, 318, 317], [328, 7, 329], [57, 126, 256], [126, 127, 256], [127, 39, 256], [39, 317, 256], [317, 264, 256], [7, 120, 197], [120, 121, 197], [121, 112, 197], [295, 329, 197], [329, 7, 197], [199, 197, 297], [197, 112, 297], [57, 256, 316], [256, 257, 316], [297, 112, 298], [57, 316, 315], [298, 112, 299], [205, 300, 204], [313, 251, 243], [212, 204, 301], [243, 244, 312], [300, 299, 115], [299, 112, 115], [204, 300, 115], [314, 313, 54], [315, 314, 54], [57, 315, 54], [313, 243, 54], [204, 115, 134], [54, 243, 129], [218, 304, 217], [309, 238, 230], [225, 217, 305], [230, 231, 308], [204, 134, 135], [129, 243, 128], [301, 204, 99], [204, 135, 99], [302, 301, 99], [243, 312, 70], [128, 243, 70], [311, 310, 70], [312, 311, 70], [217, 304, 100], [303, 302, 100], [304, 303, 100], [302, 99, 100], [309, 230, 67], [70, 310, 67], [310, 309, 67], [217, 100, 132], [67, 230, 131], [217, 132, 133], [131, 230, 130], [230, 308, 87], [307, 306, 87], [308, 307, 87], [130, 230, 87], [305, 217, 84], [306, 305, 84], [217, 133, 84], [87, 306, 84]],convexity=10);
